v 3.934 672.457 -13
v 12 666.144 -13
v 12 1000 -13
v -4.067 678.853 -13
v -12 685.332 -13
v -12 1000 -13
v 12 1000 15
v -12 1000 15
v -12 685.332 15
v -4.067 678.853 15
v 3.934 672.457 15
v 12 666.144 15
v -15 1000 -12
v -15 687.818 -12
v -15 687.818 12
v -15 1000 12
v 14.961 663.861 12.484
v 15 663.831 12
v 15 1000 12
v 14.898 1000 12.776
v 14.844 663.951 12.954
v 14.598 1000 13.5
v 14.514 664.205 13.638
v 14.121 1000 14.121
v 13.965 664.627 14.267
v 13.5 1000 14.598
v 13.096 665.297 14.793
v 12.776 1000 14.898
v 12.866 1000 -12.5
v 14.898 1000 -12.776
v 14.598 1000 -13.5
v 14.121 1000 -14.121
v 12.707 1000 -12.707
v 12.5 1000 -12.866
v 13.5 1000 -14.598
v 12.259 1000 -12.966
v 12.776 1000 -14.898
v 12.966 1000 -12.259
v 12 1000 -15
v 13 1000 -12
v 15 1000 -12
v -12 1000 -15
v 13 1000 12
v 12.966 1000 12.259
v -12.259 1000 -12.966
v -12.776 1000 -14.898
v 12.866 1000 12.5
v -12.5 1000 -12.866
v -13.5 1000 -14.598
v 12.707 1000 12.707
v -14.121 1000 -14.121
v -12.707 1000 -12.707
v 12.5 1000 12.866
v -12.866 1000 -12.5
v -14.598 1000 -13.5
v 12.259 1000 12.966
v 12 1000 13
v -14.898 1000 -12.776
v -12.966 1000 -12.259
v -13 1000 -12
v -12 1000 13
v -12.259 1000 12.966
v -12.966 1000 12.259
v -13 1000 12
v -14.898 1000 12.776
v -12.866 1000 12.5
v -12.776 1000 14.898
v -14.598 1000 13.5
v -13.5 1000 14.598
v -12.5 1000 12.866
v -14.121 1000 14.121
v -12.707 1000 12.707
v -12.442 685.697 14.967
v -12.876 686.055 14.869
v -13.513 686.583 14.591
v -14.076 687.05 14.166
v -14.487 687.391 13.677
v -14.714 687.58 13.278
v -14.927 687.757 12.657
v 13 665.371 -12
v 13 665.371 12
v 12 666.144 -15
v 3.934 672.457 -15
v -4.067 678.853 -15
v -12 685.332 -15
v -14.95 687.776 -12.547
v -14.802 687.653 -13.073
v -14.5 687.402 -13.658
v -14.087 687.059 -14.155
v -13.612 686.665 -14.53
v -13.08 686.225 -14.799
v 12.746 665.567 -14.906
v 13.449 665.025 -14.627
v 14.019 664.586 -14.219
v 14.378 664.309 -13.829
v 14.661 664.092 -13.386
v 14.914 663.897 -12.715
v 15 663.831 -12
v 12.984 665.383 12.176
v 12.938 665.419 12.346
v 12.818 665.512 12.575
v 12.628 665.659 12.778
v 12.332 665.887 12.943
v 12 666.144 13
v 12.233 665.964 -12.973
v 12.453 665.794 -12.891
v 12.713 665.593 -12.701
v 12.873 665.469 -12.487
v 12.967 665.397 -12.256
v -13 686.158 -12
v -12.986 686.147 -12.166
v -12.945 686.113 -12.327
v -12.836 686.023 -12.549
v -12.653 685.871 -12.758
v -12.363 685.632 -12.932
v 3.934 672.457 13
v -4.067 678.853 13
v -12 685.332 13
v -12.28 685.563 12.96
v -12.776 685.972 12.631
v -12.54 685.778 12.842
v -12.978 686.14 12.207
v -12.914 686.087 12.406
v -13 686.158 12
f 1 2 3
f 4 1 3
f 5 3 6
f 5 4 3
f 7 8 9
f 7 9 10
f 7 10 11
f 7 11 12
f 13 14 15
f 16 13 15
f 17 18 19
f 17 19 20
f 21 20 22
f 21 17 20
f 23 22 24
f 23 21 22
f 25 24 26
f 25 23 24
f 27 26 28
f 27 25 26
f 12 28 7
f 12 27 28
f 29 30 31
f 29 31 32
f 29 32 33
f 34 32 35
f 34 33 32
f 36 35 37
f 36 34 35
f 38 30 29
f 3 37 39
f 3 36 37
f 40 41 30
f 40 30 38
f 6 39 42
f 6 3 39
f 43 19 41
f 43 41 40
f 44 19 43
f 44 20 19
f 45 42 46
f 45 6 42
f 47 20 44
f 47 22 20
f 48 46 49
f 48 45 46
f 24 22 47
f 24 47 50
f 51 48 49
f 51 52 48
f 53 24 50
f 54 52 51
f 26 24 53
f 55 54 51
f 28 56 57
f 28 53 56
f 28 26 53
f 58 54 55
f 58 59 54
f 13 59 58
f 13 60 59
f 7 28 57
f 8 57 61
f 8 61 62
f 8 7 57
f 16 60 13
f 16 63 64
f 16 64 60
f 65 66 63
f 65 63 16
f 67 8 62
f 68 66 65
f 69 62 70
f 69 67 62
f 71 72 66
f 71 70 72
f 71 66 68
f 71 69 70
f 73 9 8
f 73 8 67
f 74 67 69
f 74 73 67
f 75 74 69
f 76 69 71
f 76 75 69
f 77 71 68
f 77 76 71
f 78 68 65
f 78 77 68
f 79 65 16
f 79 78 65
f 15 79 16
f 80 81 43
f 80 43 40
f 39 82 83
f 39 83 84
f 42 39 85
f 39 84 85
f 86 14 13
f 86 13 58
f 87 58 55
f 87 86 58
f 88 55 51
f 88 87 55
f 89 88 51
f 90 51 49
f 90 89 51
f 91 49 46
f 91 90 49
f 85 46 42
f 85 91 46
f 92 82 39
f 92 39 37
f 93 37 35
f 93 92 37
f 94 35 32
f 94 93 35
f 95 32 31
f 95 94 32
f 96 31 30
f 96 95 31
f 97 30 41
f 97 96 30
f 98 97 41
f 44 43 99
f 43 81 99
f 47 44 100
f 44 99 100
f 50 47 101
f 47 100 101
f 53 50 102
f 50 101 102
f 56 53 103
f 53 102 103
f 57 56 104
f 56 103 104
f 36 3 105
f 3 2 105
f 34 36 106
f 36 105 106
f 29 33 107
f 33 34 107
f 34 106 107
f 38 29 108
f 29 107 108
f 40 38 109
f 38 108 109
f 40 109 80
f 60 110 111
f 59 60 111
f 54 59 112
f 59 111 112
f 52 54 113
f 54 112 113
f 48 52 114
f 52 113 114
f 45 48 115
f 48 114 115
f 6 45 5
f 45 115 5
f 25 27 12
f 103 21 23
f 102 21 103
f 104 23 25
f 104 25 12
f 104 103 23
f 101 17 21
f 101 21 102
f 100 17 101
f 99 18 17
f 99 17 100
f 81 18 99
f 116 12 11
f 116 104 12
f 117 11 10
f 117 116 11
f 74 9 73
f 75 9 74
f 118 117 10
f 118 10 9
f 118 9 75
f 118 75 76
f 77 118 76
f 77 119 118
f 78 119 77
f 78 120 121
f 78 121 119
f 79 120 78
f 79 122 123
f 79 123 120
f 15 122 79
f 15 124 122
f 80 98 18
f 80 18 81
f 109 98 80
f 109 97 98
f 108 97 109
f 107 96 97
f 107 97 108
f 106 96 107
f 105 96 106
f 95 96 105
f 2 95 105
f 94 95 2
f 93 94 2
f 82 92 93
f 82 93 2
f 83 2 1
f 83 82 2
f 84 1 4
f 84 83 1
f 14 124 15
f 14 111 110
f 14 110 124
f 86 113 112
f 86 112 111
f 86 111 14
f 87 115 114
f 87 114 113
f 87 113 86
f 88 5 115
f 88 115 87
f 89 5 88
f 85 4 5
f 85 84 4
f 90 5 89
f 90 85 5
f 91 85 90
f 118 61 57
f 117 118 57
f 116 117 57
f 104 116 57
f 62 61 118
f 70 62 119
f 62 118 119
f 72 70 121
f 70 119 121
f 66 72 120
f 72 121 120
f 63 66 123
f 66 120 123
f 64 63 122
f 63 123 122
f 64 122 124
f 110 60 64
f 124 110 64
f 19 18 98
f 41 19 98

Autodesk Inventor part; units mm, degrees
ref_plane "YZ Plane" through (0, 0, 0) normal (1, 0, 0) x (0, 1, 0)
ref_plane "XZ Plane" through (0, 0, 0) normal (0, 1, 0) x (-1, 0, 0)
sketch "Sketch1" plane through (0, 0, 0) normal (0, 1, 0) x (-1, 0, 0)
  line L0 (-12, 14) -> (12, 14) construction
  line L1 (14, 12) -> (14, -12) construction
  line L2 (12, -14) -> (-12, -14) construction
  line L3 (-14, -12) -> (-14, 12) construction
  line L4 (-14, 14) -> (14, -14) construction
  line L5 (14, 14) -> (-14, -14) construction
  arc A0 (14, 12) -> (12, 14) centre (12, 12) ccw construction
  arc A1 (12, -14) -> (14, -12) centre (12, -12) ccw construction
  arc A2 (-14, -12) -> (-12, -14) centre (-12, -12) ccw construction
  arc A3 (-12, 14) -> (-14, 12) centre (-12, 12) ccw construction
  line L6 (-12, -15) -> (12, -15)
  arc A4 (12, -15) -> (15, -12) centre (12, -12) ccw
  line L7 (15, -12) -> (15, 12)
  arc A5 (15, 12) -> (12, 15) centre (12, 12) ccw
  line L8 (12, 15) -> (-12, 15)
  arc A6 (-12, 15) -> (-15, 12) centre (-12, 12) ccw
  line L9 (-15, 12) -> (-15, -12)
  arc A7 (-15, -12) -> (-12, -15) centre (-12, -12) ccw
  line L10 (13, -12) -> (13, 12)
  arc A8 (13, 12) -> (12, 13) centre (12, 12) ccw
  line L11 (12, 13) -> (-12, 13)
  arc A9 (-12, 13) -> (-13, 12) centre (-12, 12) ccw
  line L12 (-13, 12) -> (-13, -12)
  arc A10 (-13, -12) -> (-12, -13) centre (-12, -12) ccw
  line L13 (-12, -13) -> (12, -13)
  arc A11 (12, -13) -> (13, -12) centre (12, -12) ccw
  point P0 (0, 0)
  point P1 (0, 0)
  point P2 (0, 0)
  dimension "d10" = 2
  dimension "depth" = 30
  dimension "width" = 30
  dimension "thickness" = 2
extrude "Extrusion1" add sketch "Sketch1" along normal blind 1000
ref_plane "Work Plane1" through (0, 500, 0) normal (0, -1, 0) x (1, 0, 0)
sketch "Sketch5" plane through (12, 0, -15) normal (0, 0, -1) x (-1, 0, 0)
  arc A0 (-603, 460) -> (-603, 2430) centre (-603, 1445) ccw projected
  line L0 (27, 0) -> (27, 1000) projected
  line L1 (-3, 0) -> (-3, 1000) projected
  line L2 (0, 0) -> (24, 0) projected
  line L3 (0, 0) -> (-3, 0) projected
  line L4 (27, 0) -> (24, 0) projected
  point P0 (12, 0)
  point P1 (27, 687.8177)
  point P2 (-3, 663.831)
extrude "Extrusion4" cut sketch "Sketch5" against normal through all
equation "\"d10\" = thickness"
properties part number "podest duzy profil 5" material "Steel"
